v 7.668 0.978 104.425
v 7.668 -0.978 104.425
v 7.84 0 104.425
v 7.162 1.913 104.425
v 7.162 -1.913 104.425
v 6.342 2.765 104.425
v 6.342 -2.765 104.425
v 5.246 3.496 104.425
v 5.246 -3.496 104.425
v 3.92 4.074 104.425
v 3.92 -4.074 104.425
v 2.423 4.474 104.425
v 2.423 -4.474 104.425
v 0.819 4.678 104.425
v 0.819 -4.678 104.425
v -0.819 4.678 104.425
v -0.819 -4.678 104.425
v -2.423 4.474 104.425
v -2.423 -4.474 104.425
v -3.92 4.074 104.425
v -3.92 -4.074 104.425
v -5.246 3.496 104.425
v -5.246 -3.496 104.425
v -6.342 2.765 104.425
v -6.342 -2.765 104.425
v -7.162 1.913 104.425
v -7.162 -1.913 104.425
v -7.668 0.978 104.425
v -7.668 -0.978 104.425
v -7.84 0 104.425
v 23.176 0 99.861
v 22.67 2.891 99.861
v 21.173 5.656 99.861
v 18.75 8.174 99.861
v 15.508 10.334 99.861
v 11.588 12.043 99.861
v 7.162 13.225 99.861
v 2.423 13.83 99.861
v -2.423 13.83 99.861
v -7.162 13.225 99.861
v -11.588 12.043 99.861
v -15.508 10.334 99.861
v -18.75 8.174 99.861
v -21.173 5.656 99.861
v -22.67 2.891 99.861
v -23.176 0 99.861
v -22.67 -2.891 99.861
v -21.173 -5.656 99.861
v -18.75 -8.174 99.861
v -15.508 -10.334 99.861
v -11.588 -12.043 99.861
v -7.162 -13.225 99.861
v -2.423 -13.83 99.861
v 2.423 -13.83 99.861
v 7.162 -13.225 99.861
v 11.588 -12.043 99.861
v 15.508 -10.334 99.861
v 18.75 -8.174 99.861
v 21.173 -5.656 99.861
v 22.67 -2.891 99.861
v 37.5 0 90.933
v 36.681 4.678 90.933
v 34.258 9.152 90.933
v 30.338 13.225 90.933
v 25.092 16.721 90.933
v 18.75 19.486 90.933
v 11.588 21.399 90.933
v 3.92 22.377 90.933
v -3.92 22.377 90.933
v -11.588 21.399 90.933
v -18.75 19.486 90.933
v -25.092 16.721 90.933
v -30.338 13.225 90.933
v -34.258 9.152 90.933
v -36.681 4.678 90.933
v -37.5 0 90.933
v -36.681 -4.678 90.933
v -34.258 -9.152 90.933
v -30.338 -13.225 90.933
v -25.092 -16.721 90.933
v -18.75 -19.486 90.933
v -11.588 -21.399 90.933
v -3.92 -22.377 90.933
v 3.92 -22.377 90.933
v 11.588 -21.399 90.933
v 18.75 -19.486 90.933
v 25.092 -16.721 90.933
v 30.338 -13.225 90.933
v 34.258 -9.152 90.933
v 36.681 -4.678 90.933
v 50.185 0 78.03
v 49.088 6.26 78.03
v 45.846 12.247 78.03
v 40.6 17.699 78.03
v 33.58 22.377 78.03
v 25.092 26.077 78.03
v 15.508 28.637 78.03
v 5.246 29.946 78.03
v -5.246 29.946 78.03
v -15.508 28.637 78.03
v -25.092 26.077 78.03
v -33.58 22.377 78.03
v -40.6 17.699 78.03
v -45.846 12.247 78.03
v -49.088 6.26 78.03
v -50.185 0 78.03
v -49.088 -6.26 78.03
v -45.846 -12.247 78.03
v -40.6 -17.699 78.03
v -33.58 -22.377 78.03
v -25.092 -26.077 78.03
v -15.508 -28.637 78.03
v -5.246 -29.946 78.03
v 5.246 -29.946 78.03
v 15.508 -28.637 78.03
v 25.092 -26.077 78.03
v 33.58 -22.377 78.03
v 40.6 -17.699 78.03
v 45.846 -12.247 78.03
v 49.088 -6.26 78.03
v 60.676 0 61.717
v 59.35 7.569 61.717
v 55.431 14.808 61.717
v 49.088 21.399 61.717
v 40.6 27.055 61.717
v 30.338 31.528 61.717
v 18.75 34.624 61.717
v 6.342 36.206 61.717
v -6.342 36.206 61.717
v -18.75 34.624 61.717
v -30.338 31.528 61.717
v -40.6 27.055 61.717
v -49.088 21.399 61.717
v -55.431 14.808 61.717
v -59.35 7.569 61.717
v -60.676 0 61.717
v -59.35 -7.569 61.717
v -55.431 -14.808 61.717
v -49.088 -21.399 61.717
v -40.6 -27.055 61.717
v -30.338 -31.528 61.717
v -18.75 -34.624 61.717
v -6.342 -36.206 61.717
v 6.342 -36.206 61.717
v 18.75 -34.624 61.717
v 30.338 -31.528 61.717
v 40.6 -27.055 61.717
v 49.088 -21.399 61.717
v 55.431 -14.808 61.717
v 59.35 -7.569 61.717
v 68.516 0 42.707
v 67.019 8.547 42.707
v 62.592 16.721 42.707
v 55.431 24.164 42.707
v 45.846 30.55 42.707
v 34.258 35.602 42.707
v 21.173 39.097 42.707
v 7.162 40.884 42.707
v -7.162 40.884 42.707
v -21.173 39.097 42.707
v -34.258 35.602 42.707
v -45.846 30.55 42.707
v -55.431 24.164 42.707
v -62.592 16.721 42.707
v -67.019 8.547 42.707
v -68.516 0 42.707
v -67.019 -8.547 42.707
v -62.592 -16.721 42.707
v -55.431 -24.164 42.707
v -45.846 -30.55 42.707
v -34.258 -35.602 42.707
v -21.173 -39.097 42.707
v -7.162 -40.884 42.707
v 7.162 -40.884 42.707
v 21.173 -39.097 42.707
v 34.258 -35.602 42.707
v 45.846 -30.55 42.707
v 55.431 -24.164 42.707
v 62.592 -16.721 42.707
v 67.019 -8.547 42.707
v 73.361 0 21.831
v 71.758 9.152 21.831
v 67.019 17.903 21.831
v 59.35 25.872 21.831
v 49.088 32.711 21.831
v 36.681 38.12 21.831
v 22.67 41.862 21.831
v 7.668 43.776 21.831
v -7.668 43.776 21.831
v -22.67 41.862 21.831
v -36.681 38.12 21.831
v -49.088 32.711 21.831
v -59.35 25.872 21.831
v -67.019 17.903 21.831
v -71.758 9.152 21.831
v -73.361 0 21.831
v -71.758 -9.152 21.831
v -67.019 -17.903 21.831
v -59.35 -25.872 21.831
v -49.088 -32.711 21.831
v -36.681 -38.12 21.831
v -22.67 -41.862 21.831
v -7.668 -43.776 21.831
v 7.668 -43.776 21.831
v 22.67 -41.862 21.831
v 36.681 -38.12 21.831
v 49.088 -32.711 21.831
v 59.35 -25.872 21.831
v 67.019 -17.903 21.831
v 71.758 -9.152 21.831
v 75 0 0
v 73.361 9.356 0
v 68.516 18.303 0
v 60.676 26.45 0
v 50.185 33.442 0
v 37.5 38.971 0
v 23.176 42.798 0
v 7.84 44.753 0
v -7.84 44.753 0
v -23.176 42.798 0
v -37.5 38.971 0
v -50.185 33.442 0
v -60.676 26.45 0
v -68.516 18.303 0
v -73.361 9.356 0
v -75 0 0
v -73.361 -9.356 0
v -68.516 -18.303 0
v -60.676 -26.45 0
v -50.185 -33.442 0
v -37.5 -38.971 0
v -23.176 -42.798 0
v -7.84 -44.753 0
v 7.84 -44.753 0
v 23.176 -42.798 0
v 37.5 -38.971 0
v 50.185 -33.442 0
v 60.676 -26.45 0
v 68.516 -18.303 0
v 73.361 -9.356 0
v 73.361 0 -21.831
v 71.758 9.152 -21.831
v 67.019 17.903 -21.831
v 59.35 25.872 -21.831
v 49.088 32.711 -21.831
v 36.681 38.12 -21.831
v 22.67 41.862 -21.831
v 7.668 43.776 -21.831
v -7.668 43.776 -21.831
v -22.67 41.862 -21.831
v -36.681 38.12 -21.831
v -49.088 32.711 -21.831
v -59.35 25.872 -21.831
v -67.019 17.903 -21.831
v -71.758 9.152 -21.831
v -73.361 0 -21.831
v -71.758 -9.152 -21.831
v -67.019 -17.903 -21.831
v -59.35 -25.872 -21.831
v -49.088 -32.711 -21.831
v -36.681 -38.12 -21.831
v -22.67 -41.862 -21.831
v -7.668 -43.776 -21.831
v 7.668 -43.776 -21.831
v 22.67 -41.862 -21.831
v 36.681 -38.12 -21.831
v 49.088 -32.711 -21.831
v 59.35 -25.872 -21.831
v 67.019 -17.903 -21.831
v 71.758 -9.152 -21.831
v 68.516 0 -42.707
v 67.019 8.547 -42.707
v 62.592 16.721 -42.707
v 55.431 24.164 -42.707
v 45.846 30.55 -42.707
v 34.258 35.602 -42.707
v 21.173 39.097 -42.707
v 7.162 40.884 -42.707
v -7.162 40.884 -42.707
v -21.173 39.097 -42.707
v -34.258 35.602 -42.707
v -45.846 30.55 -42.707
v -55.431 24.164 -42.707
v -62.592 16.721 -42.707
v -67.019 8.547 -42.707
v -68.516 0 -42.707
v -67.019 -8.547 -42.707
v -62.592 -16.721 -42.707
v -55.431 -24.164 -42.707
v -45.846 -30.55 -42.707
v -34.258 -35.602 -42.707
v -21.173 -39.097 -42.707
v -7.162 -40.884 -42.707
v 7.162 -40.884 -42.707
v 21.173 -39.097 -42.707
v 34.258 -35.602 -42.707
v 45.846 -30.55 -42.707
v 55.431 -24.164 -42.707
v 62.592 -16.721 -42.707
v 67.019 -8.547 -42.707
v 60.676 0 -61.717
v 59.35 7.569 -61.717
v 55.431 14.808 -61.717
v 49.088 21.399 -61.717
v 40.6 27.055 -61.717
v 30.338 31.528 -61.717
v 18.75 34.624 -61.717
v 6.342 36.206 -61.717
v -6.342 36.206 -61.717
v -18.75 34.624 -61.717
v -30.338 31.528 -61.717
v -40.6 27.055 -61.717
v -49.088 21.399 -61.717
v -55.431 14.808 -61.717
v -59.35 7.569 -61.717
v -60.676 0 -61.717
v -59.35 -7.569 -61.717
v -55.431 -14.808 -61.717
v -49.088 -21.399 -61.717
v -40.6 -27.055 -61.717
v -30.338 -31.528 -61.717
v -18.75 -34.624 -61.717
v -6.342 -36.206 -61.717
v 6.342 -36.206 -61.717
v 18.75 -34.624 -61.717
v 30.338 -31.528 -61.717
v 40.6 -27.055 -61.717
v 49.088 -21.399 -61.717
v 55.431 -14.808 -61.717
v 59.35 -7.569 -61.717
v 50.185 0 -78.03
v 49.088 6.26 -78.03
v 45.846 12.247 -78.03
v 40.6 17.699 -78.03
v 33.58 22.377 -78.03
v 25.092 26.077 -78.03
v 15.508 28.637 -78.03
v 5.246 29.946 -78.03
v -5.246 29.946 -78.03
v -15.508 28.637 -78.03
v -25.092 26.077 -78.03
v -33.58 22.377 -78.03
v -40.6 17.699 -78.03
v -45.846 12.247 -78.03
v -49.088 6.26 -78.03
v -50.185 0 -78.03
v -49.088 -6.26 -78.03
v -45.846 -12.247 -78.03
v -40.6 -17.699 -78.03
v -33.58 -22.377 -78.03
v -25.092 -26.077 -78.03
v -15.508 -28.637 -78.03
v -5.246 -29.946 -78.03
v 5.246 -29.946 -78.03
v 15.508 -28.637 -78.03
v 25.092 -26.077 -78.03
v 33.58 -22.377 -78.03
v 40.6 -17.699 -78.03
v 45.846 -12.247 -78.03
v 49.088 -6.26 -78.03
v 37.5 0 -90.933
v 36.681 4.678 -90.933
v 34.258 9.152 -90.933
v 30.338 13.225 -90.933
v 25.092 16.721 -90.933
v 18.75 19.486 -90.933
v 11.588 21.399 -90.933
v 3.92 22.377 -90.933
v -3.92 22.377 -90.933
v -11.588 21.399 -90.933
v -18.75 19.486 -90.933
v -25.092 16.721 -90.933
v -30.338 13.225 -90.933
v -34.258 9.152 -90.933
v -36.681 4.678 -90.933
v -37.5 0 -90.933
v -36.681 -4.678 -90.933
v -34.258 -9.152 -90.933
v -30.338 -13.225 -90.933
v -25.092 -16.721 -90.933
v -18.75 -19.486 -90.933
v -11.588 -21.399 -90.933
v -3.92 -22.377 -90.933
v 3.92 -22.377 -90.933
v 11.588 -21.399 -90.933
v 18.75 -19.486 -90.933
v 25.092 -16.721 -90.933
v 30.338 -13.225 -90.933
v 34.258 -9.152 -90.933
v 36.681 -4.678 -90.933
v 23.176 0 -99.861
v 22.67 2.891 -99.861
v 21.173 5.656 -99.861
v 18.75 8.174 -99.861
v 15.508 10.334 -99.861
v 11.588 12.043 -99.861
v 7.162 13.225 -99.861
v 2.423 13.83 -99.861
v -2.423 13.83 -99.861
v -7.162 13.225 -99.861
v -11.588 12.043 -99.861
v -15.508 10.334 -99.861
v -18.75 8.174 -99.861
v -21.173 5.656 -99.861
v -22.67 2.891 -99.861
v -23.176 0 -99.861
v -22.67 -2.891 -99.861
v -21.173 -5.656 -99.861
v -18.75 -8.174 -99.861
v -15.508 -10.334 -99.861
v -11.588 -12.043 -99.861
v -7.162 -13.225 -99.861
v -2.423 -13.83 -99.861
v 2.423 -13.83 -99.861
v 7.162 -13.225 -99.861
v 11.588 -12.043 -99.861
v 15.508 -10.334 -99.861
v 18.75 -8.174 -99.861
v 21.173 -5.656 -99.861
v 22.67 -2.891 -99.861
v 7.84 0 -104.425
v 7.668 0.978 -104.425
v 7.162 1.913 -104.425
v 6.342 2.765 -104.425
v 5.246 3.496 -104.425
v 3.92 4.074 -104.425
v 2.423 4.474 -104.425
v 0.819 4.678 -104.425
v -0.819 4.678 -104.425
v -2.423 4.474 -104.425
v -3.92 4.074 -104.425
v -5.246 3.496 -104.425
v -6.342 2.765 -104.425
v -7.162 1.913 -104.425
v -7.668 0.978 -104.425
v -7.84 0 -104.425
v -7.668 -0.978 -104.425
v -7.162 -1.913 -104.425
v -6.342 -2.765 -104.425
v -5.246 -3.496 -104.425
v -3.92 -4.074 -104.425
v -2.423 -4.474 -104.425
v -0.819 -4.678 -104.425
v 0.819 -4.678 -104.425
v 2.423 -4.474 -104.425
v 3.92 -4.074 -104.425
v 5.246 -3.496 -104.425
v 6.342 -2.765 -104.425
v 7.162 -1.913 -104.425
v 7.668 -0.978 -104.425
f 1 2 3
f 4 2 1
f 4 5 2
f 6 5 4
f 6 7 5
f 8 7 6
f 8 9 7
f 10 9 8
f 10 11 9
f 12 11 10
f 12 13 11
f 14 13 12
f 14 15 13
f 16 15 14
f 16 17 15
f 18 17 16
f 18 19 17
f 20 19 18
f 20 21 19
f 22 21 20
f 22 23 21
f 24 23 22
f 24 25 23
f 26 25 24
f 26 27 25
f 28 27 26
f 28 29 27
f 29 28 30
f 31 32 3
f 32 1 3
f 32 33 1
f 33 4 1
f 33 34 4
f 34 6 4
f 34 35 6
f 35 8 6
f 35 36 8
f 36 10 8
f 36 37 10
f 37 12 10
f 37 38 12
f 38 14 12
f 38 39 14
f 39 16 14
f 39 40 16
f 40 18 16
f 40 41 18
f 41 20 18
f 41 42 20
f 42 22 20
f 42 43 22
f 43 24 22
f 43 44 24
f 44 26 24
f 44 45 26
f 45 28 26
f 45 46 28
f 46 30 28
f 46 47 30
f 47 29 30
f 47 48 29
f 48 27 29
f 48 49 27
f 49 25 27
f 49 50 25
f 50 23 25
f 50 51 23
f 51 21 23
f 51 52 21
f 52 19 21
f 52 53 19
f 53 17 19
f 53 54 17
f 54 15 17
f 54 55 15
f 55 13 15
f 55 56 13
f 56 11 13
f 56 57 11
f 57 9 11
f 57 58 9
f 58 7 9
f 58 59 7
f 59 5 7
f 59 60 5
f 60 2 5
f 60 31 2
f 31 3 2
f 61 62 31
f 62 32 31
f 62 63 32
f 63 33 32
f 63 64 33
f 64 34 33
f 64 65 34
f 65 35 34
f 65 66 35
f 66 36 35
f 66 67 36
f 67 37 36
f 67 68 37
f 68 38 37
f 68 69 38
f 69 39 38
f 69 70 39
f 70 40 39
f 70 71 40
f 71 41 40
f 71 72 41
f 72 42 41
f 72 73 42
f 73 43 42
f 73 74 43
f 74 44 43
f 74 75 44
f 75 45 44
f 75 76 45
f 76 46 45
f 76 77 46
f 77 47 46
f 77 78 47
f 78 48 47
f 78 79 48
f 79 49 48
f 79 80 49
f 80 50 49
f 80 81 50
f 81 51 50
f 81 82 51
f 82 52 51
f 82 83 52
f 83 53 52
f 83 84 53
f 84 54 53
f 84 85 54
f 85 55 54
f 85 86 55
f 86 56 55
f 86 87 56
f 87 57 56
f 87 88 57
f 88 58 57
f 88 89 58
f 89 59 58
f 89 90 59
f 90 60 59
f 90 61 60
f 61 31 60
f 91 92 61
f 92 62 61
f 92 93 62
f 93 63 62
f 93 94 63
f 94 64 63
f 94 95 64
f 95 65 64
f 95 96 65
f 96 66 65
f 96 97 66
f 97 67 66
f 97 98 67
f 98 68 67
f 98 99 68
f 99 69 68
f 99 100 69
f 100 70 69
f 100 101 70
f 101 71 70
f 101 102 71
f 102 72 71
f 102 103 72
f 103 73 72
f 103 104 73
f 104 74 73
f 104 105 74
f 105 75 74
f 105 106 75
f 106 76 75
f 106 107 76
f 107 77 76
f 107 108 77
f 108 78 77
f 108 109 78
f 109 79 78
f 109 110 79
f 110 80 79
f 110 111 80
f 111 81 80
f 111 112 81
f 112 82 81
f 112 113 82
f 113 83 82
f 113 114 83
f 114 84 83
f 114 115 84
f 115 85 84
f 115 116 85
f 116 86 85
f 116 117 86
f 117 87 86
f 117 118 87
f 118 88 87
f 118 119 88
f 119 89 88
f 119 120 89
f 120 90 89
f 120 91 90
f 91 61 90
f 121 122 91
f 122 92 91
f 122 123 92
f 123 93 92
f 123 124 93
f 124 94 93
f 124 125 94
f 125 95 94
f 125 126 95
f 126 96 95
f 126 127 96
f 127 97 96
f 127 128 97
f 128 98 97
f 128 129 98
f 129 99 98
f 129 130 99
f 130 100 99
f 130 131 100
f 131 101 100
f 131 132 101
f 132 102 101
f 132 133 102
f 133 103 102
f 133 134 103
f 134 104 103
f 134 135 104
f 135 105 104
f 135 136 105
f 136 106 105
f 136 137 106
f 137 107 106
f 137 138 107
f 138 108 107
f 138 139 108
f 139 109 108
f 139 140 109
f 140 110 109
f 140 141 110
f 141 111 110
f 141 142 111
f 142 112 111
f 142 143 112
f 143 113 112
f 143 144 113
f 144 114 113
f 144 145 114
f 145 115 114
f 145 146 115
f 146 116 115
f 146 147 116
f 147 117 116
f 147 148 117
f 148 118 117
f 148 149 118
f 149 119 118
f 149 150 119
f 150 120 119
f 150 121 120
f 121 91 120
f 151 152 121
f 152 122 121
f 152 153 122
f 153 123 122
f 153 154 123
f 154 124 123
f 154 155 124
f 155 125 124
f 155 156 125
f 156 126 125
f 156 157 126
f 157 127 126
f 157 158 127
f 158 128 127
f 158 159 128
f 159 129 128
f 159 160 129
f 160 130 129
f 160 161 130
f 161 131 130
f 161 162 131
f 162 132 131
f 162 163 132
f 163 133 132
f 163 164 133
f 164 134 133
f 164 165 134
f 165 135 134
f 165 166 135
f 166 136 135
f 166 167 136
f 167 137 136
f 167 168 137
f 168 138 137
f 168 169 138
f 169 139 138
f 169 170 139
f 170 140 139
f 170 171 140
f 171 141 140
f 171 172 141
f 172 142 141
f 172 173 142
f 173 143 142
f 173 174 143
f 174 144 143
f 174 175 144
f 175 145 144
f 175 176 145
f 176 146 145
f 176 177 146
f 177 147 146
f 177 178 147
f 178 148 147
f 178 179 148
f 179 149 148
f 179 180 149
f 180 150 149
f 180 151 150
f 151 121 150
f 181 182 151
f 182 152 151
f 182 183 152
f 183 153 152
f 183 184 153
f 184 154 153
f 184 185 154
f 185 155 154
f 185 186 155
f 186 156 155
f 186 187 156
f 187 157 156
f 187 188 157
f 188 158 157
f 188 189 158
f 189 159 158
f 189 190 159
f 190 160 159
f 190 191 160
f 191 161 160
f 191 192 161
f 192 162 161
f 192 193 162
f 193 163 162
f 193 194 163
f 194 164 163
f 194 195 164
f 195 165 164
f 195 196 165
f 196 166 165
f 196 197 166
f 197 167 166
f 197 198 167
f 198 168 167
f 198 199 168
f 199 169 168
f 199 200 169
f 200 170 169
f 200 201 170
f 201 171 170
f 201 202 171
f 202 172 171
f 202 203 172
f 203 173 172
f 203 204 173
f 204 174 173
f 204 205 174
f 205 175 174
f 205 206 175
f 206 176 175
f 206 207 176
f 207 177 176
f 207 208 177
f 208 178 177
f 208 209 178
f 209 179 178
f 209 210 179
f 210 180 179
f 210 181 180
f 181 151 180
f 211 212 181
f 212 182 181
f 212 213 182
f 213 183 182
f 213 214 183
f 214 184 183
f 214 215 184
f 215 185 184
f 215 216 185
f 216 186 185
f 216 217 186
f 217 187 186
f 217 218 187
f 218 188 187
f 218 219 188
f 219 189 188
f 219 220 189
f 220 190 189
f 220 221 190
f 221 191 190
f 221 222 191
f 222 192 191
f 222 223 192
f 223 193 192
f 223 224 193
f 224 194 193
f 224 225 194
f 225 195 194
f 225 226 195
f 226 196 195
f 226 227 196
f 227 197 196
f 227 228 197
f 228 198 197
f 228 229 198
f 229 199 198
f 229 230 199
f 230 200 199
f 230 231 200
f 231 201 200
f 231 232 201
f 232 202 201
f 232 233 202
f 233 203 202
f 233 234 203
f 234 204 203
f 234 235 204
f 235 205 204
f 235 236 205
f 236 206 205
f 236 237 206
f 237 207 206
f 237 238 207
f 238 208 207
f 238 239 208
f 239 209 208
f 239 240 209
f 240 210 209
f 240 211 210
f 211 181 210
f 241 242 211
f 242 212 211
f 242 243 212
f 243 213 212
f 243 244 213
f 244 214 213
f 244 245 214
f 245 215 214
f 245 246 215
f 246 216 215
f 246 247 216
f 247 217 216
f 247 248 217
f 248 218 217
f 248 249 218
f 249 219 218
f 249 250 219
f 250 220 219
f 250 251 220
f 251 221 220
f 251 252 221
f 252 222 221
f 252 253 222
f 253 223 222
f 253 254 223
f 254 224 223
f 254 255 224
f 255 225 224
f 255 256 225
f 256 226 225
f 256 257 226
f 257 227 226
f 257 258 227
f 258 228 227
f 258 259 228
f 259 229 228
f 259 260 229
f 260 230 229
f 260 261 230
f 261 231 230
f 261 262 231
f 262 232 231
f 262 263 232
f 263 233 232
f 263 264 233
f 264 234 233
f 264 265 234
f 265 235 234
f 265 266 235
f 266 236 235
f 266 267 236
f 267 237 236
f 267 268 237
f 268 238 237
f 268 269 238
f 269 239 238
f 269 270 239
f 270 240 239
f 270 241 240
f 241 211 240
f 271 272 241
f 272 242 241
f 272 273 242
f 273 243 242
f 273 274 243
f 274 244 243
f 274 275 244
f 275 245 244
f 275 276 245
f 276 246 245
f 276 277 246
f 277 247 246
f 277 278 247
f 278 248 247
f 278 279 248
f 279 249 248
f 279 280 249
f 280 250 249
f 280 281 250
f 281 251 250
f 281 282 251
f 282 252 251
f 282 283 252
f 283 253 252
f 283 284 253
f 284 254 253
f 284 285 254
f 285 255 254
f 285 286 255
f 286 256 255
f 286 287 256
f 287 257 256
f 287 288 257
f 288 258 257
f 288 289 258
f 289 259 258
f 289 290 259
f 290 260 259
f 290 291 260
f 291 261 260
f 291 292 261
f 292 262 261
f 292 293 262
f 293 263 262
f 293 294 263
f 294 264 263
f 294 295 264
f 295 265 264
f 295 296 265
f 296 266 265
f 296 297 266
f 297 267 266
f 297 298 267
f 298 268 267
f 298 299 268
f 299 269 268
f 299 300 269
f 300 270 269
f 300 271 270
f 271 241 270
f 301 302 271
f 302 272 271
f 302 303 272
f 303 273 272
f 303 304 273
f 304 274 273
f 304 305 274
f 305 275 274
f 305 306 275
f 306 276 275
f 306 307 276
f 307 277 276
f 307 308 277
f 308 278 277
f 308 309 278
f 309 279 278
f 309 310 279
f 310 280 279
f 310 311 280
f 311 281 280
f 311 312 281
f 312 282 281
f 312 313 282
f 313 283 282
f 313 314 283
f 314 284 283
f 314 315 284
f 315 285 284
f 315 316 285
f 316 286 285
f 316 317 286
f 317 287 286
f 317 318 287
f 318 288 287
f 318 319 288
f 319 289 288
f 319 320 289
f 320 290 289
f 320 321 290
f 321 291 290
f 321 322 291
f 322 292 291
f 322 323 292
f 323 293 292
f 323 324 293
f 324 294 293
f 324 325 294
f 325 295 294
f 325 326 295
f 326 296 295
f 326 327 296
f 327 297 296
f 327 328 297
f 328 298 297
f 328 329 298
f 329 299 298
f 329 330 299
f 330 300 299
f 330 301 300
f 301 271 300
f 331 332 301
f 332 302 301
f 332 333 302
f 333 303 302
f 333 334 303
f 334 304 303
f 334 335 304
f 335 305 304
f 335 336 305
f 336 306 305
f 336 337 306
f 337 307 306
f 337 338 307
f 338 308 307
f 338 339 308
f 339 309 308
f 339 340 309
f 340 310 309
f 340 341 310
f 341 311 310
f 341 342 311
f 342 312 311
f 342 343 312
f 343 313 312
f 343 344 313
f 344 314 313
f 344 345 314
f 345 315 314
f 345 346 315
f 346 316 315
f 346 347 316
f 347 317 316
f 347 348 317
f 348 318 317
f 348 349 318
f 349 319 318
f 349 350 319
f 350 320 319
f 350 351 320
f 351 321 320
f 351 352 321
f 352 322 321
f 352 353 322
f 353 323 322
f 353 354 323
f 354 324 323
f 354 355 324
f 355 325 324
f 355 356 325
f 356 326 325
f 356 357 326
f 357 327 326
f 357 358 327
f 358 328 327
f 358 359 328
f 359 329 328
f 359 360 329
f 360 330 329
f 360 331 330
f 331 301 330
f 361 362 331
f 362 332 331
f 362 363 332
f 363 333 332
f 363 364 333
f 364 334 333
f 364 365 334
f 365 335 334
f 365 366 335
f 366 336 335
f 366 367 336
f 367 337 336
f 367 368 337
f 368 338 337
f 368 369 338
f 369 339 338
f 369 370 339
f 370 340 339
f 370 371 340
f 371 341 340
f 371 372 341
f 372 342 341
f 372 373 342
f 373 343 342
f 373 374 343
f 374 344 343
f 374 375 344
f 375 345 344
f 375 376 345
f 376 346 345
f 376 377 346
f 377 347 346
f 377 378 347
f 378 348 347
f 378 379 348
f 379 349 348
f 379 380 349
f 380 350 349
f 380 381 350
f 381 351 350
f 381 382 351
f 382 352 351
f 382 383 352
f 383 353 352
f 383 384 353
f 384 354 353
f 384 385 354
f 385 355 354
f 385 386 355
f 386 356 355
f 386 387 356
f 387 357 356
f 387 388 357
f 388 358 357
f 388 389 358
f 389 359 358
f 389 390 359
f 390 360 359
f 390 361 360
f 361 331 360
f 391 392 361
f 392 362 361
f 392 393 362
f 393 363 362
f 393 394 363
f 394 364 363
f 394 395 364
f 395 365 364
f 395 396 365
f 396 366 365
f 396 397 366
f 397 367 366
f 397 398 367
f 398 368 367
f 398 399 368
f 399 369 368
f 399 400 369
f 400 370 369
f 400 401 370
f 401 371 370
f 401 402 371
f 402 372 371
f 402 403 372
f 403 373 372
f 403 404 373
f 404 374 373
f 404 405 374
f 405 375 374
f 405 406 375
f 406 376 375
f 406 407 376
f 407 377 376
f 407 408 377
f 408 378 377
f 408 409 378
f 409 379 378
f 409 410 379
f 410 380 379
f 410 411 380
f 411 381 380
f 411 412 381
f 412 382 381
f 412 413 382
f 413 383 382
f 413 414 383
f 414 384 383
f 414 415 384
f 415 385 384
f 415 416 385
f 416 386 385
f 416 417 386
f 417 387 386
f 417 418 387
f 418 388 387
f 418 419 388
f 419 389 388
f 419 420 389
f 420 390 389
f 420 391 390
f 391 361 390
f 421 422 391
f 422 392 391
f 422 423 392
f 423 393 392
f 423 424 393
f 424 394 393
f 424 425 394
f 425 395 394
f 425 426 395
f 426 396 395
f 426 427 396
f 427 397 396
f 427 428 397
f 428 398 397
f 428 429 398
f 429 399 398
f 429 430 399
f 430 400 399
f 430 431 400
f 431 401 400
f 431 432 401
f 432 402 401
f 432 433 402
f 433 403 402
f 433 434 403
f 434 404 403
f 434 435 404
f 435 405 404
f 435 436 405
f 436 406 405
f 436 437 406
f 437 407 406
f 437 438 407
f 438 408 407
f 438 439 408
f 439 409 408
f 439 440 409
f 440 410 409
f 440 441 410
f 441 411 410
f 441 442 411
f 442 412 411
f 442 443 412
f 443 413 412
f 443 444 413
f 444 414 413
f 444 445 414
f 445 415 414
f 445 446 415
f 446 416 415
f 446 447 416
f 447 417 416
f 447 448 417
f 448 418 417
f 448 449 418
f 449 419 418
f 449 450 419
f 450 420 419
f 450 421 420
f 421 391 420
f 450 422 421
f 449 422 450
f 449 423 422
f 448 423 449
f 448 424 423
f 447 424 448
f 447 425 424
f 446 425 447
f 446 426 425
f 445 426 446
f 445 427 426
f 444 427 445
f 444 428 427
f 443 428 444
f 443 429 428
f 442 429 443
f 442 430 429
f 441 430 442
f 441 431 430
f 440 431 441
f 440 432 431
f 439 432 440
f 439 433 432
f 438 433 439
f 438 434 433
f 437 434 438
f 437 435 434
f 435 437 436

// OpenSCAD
// Generated by SolidPython 1.0.1 on 2020-07-29 00:46:46


scale(v = [5, 3, 7]) {
	sphere(r = 15);
}
/***********************************************
*********      SolidPython code:      **********
************************************************
 
# import packages: SolidPython
from solid import *
from solid.utils import *
from itertools import chain, combinations, permutations


class Resize:

    def __init__(self, scad_file):
        self.scad_file = scad_file
        #self.scad_file = import_scad(scad_file)
        # cone/cylinder param:
        self.r1 = 0
        self.r2 = 0
        self.h = 0
        # rectangular prism param:
        self.w = 0
        self.l = 0
        # ellipse param:
        self.r = 0

    # import OpenScad code (file name corresponds to shape)


    # classify shape + parameters
    def assign(self, param1, param2, param3):
        if self.scad_file == 'cone.scad':
            self.r1 = param1
            self.r2 = param2
            self.h = param3
        elif self.scad_file == 'cylinder.scad':
            self.r1 = param1
            self.r2 = param2
            self.h = param3
        elif self.scad_file == 'rectangularPrism.scad':
            self.h = param1
            self.l = param2
            self.w = param3
        else:
            self.r = param1
            self.h = param2

    # resize parameters
    def iterate(self):
        x = range(3, 20, 2)
        i = 1
        if self.scad_file == 'cone.scad':
            tempList = list(permutations(x, 2))
            for temp in tempList:
                param1 = temp[0]
                param2 = temp[1]
                filepath = 'produced_scad_files/' + 'cone' + str(param1) + '_' + str(param2) + '_' + '.scad'
                scad_render_to_file(cylinder(h=param1, r1=param2, r2=0), filepath)

        elif self.scad_file == 'cylinder.scad':
            tempList = list(permutations(x, 3))
            for temp in tempList:
                param1 = temp[0]
                param2 = temp[1]
                filepath = 'produced_scad_files/' + 'cylinder' + str(param1) + '_' + str(param2) + '_' + '.scad'
                scad_render_to_file(cylinder(h=param1, r1=param2, r2=param2), filepath)

        elif self.scad_file == 'rectangularPrism.scad':
            tempList = list(permutations(x, 3))
            for temp in tempList:
                param1 = temp[0]
                param2 = temp[1]
                param3 = temp[2]
                filepath = 'produced_scad_files/' + 'rectangularPrism' + str(param1) + '_' + str(param2) + '_' + str(
                    param3) + '.scad'
                scad_render_to_file(cube(size=(param1, param2, param3)), filepath)

        elif self.scad_file == 'ellipse.scad':
            tempList = list(permutations(x, 4))
            for temp in tempList:
                param1 = temp[0]
                param2 = temp[1]
                param3 = temp[2]
                param4 = temp[3]
                filepath = 'produced_scad_files/' + 'ellipse' + str(param1) + '_' + str(param2) + '_' + str(param3) + '_' + str(param4) + '.scad'
                scad_render_to_file(scale([param1, param2, param3])(sphere(r=param4)), filepath)

    def render_to_scadfile(self):
        scad_render_to_file(scad, 'example.scad') 
 
************************************************/
